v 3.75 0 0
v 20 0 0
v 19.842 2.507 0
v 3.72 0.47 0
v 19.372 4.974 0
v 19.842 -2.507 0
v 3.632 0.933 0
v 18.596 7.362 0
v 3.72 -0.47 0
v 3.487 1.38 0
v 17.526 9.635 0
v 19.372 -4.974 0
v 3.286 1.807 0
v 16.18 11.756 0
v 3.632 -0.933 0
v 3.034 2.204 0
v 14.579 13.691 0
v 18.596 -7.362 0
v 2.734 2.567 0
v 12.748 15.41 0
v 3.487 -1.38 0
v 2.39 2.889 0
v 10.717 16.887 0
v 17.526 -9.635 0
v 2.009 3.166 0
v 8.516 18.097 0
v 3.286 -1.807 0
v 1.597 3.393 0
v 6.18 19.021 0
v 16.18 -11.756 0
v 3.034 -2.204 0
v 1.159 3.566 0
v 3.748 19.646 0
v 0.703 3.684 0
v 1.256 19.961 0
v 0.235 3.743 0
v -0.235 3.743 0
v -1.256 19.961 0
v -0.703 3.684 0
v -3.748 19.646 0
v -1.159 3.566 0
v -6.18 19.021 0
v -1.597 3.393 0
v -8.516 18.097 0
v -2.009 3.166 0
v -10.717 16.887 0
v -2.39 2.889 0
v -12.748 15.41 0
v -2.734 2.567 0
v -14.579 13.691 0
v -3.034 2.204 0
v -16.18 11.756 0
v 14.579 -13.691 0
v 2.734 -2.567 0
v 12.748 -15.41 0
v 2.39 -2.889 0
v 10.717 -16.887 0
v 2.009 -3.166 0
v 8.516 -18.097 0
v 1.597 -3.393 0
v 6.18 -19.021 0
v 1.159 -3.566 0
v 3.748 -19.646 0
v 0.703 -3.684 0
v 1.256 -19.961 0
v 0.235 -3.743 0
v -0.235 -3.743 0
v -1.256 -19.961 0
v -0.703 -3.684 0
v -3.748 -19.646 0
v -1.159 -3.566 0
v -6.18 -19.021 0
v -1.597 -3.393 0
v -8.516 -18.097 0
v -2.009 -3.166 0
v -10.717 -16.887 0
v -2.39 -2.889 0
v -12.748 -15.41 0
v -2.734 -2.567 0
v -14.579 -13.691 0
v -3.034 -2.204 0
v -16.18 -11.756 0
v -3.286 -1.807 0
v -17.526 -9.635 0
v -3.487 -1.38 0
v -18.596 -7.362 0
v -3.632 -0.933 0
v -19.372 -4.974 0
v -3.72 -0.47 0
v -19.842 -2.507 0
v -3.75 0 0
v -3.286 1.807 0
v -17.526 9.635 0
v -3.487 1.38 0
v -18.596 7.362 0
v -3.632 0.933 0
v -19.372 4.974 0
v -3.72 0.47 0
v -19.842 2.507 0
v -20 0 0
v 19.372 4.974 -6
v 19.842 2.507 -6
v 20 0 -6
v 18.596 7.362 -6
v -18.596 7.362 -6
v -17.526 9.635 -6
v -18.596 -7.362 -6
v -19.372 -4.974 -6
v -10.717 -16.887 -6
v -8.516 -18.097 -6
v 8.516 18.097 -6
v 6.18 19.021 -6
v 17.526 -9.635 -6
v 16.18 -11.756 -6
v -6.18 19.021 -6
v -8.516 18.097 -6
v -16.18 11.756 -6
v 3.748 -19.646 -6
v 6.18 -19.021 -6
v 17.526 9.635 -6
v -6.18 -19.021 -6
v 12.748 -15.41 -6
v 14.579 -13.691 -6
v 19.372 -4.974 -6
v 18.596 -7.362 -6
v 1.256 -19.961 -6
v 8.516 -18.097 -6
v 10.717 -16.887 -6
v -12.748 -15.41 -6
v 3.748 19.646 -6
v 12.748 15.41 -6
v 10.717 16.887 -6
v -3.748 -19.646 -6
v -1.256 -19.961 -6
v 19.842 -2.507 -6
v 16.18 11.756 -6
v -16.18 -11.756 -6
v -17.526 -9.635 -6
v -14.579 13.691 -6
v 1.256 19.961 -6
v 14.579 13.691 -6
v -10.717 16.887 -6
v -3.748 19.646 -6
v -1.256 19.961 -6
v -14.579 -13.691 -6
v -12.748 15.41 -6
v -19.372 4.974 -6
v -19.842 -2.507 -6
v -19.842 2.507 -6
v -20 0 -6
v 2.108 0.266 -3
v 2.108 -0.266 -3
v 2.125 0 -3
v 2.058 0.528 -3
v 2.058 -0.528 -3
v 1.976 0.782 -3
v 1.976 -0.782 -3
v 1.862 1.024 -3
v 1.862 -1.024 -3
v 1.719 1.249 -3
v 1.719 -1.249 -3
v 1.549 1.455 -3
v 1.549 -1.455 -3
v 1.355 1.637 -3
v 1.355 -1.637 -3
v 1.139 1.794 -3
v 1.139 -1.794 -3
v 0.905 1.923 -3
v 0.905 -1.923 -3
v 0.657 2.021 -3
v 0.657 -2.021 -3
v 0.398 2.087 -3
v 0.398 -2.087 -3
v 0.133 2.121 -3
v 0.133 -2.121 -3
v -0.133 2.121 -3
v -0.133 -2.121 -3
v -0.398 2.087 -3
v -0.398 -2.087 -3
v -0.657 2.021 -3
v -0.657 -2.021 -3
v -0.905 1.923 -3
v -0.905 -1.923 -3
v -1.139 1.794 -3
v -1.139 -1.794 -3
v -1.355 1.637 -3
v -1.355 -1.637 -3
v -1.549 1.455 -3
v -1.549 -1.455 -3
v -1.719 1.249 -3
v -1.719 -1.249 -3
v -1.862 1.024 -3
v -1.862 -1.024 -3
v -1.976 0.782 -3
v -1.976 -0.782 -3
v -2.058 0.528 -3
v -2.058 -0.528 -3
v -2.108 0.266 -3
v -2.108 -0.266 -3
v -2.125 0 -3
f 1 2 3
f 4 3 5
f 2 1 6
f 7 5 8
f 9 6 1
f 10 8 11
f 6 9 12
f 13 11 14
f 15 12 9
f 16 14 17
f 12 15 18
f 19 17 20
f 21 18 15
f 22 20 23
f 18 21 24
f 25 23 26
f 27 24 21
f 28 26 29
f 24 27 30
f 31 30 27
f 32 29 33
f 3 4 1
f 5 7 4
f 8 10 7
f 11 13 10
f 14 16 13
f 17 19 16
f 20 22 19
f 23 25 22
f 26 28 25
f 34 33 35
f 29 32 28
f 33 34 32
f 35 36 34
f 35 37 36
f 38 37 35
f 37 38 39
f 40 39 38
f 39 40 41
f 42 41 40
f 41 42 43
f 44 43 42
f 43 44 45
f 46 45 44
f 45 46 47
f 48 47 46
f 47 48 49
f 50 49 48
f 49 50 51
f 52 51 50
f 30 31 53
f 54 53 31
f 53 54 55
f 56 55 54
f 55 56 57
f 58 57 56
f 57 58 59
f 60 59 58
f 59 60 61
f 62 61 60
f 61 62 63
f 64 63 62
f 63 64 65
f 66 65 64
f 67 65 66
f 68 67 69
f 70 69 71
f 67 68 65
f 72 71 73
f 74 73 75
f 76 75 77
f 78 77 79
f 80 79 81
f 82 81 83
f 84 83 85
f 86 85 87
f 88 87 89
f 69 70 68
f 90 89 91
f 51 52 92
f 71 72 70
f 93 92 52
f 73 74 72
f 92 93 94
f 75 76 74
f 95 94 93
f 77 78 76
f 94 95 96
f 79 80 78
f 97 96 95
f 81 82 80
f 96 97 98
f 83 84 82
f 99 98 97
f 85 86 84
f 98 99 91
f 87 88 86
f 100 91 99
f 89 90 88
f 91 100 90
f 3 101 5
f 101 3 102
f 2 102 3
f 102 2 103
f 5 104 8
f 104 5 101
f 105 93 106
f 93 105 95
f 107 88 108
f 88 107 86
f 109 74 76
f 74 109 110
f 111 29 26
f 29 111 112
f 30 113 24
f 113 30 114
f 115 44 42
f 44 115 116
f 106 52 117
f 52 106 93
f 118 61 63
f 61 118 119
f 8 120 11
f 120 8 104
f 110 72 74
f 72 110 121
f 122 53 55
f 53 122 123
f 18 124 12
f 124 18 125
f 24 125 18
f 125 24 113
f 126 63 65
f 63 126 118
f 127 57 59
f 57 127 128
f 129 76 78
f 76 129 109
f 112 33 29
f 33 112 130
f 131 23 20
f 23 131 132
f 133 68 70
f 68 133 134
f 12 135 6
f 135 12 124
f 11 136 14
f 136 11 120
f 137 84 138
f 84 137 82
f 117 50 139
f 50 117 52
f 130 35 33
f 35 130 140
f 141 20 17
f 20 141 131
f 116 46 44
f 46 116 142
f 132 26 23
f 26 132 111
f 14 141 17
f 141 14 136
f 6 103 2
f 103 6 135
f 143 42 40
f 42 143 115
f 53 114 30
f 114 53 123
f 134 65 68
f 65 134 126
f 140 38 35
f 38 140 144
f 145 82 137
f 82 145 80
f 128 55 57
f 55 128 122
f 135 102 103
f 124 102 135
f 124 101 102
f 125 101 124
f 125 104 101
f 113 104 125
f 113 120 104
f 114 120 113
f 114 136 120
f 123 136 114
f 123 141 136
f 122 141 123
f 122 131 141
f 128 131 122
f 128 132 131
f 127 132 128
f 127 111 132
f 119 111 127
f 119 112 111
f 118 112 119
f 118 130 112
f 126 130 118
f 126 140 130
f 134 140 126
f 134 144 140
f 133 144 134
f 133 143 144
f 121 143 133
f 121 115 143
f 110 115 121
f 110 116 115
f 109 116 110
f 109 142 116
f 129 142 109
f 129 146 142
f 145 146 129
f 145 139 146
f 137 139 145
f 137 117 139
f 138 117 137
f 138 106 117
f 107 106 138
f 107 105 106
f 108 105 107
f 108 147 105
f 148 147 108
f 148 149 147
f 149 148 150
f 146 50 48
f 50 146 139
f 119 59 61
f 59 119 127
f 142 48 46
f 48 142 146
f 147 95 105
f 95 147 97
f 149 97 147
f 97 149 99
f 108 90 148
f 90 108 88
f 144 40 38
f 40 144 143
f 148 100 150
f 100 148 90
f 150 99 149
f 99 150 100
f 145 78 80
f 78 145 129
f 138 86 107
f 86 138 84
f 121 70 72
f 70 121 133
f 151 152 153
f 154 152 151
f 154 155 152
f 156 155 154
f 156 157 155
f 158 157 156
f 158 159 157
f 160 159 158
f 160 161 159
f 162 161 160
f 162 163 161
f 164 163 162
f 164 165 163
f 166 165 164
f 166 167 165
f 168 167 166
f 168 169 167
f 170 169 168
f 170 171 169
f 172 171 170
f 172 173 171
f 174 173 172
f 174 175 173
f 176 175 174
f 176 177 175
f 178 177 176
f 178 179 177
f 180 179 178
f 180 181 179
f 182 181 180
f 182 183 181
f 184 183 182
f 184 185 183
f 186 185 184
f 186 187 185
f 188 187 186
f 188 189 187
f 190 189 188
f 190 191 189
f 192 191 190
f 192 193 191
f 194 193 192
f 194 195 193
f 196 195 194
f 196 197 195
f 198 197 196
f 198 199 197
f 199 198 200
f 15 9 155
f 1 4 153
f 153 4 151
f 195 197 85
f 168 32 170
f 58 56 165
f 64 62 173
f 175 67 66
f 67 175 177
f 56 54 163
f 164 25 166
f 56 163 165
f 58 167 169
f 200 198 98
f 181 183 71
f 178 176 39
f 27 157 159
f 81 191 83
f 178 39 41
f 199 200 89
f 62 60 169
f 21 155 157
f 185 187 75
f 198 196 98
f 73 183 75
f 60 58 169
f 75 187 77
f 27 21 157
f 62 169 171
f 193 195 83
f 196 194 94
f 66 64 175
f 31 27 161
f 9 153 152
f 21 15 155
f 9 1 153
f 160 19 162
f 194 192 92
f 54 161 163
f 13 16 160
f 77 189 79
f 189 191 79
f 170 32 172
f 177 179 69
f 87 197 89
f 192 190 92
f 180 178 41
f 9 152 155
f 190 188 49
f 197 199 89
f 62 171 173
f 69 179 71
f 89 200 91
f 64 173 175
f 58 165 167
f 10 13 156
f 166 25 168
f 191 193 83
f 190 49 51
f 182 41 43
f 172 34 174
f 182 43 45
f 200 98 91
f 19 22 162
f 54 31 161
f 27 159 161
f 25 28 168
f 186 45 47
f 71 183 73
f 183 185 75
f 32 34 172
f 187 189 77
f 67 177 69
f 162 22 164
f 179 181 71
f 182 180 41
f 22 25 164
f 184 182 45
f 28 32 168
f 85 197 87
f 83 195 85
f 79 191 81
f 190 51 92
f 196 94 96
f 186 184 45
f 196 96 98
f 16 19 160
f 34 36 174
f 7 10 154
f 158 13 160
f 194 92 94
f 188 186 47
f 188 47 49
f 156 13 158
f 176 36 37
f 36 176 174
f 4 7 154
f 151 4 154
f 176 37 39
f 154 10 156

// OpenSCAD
$fn = 50;


difference() {
	union() {
		translate(v = [0, 0, -3.0000000000]) {
			cylinder(h = 3, r = 10.0000000000);
		}
		translate(v = [0, 0, -6.0000000000]) {
			cylinder(h = 6, r = 20.0000000000);
		}
	}
	union() {
		translate(v = [0, 0, 0]) {
			rotate(a = [0, 0, 0]) {
				difference() {
					union() {
						#translate(v = [0, 0, -3.0000000000]) {
							cylinder(h = 3, r = 2.0000000000);
						}
						#translate(v = [0, 0, -3]) {
							cylinder(h = 3, r1 = 2.1250000000, r2 = 3.7500000000);
						}
						#translate(v = [0, 0, -3.0000000000]) {
							cylinder(h = 3, r = 2.1250000000);
						}
						#translate(v = [0, 0, -3.0000000000]) {
							cylinder(h = 3, r = 2.0000000000);
						}
					}
					union();
				}
			}
		}
	}
}
